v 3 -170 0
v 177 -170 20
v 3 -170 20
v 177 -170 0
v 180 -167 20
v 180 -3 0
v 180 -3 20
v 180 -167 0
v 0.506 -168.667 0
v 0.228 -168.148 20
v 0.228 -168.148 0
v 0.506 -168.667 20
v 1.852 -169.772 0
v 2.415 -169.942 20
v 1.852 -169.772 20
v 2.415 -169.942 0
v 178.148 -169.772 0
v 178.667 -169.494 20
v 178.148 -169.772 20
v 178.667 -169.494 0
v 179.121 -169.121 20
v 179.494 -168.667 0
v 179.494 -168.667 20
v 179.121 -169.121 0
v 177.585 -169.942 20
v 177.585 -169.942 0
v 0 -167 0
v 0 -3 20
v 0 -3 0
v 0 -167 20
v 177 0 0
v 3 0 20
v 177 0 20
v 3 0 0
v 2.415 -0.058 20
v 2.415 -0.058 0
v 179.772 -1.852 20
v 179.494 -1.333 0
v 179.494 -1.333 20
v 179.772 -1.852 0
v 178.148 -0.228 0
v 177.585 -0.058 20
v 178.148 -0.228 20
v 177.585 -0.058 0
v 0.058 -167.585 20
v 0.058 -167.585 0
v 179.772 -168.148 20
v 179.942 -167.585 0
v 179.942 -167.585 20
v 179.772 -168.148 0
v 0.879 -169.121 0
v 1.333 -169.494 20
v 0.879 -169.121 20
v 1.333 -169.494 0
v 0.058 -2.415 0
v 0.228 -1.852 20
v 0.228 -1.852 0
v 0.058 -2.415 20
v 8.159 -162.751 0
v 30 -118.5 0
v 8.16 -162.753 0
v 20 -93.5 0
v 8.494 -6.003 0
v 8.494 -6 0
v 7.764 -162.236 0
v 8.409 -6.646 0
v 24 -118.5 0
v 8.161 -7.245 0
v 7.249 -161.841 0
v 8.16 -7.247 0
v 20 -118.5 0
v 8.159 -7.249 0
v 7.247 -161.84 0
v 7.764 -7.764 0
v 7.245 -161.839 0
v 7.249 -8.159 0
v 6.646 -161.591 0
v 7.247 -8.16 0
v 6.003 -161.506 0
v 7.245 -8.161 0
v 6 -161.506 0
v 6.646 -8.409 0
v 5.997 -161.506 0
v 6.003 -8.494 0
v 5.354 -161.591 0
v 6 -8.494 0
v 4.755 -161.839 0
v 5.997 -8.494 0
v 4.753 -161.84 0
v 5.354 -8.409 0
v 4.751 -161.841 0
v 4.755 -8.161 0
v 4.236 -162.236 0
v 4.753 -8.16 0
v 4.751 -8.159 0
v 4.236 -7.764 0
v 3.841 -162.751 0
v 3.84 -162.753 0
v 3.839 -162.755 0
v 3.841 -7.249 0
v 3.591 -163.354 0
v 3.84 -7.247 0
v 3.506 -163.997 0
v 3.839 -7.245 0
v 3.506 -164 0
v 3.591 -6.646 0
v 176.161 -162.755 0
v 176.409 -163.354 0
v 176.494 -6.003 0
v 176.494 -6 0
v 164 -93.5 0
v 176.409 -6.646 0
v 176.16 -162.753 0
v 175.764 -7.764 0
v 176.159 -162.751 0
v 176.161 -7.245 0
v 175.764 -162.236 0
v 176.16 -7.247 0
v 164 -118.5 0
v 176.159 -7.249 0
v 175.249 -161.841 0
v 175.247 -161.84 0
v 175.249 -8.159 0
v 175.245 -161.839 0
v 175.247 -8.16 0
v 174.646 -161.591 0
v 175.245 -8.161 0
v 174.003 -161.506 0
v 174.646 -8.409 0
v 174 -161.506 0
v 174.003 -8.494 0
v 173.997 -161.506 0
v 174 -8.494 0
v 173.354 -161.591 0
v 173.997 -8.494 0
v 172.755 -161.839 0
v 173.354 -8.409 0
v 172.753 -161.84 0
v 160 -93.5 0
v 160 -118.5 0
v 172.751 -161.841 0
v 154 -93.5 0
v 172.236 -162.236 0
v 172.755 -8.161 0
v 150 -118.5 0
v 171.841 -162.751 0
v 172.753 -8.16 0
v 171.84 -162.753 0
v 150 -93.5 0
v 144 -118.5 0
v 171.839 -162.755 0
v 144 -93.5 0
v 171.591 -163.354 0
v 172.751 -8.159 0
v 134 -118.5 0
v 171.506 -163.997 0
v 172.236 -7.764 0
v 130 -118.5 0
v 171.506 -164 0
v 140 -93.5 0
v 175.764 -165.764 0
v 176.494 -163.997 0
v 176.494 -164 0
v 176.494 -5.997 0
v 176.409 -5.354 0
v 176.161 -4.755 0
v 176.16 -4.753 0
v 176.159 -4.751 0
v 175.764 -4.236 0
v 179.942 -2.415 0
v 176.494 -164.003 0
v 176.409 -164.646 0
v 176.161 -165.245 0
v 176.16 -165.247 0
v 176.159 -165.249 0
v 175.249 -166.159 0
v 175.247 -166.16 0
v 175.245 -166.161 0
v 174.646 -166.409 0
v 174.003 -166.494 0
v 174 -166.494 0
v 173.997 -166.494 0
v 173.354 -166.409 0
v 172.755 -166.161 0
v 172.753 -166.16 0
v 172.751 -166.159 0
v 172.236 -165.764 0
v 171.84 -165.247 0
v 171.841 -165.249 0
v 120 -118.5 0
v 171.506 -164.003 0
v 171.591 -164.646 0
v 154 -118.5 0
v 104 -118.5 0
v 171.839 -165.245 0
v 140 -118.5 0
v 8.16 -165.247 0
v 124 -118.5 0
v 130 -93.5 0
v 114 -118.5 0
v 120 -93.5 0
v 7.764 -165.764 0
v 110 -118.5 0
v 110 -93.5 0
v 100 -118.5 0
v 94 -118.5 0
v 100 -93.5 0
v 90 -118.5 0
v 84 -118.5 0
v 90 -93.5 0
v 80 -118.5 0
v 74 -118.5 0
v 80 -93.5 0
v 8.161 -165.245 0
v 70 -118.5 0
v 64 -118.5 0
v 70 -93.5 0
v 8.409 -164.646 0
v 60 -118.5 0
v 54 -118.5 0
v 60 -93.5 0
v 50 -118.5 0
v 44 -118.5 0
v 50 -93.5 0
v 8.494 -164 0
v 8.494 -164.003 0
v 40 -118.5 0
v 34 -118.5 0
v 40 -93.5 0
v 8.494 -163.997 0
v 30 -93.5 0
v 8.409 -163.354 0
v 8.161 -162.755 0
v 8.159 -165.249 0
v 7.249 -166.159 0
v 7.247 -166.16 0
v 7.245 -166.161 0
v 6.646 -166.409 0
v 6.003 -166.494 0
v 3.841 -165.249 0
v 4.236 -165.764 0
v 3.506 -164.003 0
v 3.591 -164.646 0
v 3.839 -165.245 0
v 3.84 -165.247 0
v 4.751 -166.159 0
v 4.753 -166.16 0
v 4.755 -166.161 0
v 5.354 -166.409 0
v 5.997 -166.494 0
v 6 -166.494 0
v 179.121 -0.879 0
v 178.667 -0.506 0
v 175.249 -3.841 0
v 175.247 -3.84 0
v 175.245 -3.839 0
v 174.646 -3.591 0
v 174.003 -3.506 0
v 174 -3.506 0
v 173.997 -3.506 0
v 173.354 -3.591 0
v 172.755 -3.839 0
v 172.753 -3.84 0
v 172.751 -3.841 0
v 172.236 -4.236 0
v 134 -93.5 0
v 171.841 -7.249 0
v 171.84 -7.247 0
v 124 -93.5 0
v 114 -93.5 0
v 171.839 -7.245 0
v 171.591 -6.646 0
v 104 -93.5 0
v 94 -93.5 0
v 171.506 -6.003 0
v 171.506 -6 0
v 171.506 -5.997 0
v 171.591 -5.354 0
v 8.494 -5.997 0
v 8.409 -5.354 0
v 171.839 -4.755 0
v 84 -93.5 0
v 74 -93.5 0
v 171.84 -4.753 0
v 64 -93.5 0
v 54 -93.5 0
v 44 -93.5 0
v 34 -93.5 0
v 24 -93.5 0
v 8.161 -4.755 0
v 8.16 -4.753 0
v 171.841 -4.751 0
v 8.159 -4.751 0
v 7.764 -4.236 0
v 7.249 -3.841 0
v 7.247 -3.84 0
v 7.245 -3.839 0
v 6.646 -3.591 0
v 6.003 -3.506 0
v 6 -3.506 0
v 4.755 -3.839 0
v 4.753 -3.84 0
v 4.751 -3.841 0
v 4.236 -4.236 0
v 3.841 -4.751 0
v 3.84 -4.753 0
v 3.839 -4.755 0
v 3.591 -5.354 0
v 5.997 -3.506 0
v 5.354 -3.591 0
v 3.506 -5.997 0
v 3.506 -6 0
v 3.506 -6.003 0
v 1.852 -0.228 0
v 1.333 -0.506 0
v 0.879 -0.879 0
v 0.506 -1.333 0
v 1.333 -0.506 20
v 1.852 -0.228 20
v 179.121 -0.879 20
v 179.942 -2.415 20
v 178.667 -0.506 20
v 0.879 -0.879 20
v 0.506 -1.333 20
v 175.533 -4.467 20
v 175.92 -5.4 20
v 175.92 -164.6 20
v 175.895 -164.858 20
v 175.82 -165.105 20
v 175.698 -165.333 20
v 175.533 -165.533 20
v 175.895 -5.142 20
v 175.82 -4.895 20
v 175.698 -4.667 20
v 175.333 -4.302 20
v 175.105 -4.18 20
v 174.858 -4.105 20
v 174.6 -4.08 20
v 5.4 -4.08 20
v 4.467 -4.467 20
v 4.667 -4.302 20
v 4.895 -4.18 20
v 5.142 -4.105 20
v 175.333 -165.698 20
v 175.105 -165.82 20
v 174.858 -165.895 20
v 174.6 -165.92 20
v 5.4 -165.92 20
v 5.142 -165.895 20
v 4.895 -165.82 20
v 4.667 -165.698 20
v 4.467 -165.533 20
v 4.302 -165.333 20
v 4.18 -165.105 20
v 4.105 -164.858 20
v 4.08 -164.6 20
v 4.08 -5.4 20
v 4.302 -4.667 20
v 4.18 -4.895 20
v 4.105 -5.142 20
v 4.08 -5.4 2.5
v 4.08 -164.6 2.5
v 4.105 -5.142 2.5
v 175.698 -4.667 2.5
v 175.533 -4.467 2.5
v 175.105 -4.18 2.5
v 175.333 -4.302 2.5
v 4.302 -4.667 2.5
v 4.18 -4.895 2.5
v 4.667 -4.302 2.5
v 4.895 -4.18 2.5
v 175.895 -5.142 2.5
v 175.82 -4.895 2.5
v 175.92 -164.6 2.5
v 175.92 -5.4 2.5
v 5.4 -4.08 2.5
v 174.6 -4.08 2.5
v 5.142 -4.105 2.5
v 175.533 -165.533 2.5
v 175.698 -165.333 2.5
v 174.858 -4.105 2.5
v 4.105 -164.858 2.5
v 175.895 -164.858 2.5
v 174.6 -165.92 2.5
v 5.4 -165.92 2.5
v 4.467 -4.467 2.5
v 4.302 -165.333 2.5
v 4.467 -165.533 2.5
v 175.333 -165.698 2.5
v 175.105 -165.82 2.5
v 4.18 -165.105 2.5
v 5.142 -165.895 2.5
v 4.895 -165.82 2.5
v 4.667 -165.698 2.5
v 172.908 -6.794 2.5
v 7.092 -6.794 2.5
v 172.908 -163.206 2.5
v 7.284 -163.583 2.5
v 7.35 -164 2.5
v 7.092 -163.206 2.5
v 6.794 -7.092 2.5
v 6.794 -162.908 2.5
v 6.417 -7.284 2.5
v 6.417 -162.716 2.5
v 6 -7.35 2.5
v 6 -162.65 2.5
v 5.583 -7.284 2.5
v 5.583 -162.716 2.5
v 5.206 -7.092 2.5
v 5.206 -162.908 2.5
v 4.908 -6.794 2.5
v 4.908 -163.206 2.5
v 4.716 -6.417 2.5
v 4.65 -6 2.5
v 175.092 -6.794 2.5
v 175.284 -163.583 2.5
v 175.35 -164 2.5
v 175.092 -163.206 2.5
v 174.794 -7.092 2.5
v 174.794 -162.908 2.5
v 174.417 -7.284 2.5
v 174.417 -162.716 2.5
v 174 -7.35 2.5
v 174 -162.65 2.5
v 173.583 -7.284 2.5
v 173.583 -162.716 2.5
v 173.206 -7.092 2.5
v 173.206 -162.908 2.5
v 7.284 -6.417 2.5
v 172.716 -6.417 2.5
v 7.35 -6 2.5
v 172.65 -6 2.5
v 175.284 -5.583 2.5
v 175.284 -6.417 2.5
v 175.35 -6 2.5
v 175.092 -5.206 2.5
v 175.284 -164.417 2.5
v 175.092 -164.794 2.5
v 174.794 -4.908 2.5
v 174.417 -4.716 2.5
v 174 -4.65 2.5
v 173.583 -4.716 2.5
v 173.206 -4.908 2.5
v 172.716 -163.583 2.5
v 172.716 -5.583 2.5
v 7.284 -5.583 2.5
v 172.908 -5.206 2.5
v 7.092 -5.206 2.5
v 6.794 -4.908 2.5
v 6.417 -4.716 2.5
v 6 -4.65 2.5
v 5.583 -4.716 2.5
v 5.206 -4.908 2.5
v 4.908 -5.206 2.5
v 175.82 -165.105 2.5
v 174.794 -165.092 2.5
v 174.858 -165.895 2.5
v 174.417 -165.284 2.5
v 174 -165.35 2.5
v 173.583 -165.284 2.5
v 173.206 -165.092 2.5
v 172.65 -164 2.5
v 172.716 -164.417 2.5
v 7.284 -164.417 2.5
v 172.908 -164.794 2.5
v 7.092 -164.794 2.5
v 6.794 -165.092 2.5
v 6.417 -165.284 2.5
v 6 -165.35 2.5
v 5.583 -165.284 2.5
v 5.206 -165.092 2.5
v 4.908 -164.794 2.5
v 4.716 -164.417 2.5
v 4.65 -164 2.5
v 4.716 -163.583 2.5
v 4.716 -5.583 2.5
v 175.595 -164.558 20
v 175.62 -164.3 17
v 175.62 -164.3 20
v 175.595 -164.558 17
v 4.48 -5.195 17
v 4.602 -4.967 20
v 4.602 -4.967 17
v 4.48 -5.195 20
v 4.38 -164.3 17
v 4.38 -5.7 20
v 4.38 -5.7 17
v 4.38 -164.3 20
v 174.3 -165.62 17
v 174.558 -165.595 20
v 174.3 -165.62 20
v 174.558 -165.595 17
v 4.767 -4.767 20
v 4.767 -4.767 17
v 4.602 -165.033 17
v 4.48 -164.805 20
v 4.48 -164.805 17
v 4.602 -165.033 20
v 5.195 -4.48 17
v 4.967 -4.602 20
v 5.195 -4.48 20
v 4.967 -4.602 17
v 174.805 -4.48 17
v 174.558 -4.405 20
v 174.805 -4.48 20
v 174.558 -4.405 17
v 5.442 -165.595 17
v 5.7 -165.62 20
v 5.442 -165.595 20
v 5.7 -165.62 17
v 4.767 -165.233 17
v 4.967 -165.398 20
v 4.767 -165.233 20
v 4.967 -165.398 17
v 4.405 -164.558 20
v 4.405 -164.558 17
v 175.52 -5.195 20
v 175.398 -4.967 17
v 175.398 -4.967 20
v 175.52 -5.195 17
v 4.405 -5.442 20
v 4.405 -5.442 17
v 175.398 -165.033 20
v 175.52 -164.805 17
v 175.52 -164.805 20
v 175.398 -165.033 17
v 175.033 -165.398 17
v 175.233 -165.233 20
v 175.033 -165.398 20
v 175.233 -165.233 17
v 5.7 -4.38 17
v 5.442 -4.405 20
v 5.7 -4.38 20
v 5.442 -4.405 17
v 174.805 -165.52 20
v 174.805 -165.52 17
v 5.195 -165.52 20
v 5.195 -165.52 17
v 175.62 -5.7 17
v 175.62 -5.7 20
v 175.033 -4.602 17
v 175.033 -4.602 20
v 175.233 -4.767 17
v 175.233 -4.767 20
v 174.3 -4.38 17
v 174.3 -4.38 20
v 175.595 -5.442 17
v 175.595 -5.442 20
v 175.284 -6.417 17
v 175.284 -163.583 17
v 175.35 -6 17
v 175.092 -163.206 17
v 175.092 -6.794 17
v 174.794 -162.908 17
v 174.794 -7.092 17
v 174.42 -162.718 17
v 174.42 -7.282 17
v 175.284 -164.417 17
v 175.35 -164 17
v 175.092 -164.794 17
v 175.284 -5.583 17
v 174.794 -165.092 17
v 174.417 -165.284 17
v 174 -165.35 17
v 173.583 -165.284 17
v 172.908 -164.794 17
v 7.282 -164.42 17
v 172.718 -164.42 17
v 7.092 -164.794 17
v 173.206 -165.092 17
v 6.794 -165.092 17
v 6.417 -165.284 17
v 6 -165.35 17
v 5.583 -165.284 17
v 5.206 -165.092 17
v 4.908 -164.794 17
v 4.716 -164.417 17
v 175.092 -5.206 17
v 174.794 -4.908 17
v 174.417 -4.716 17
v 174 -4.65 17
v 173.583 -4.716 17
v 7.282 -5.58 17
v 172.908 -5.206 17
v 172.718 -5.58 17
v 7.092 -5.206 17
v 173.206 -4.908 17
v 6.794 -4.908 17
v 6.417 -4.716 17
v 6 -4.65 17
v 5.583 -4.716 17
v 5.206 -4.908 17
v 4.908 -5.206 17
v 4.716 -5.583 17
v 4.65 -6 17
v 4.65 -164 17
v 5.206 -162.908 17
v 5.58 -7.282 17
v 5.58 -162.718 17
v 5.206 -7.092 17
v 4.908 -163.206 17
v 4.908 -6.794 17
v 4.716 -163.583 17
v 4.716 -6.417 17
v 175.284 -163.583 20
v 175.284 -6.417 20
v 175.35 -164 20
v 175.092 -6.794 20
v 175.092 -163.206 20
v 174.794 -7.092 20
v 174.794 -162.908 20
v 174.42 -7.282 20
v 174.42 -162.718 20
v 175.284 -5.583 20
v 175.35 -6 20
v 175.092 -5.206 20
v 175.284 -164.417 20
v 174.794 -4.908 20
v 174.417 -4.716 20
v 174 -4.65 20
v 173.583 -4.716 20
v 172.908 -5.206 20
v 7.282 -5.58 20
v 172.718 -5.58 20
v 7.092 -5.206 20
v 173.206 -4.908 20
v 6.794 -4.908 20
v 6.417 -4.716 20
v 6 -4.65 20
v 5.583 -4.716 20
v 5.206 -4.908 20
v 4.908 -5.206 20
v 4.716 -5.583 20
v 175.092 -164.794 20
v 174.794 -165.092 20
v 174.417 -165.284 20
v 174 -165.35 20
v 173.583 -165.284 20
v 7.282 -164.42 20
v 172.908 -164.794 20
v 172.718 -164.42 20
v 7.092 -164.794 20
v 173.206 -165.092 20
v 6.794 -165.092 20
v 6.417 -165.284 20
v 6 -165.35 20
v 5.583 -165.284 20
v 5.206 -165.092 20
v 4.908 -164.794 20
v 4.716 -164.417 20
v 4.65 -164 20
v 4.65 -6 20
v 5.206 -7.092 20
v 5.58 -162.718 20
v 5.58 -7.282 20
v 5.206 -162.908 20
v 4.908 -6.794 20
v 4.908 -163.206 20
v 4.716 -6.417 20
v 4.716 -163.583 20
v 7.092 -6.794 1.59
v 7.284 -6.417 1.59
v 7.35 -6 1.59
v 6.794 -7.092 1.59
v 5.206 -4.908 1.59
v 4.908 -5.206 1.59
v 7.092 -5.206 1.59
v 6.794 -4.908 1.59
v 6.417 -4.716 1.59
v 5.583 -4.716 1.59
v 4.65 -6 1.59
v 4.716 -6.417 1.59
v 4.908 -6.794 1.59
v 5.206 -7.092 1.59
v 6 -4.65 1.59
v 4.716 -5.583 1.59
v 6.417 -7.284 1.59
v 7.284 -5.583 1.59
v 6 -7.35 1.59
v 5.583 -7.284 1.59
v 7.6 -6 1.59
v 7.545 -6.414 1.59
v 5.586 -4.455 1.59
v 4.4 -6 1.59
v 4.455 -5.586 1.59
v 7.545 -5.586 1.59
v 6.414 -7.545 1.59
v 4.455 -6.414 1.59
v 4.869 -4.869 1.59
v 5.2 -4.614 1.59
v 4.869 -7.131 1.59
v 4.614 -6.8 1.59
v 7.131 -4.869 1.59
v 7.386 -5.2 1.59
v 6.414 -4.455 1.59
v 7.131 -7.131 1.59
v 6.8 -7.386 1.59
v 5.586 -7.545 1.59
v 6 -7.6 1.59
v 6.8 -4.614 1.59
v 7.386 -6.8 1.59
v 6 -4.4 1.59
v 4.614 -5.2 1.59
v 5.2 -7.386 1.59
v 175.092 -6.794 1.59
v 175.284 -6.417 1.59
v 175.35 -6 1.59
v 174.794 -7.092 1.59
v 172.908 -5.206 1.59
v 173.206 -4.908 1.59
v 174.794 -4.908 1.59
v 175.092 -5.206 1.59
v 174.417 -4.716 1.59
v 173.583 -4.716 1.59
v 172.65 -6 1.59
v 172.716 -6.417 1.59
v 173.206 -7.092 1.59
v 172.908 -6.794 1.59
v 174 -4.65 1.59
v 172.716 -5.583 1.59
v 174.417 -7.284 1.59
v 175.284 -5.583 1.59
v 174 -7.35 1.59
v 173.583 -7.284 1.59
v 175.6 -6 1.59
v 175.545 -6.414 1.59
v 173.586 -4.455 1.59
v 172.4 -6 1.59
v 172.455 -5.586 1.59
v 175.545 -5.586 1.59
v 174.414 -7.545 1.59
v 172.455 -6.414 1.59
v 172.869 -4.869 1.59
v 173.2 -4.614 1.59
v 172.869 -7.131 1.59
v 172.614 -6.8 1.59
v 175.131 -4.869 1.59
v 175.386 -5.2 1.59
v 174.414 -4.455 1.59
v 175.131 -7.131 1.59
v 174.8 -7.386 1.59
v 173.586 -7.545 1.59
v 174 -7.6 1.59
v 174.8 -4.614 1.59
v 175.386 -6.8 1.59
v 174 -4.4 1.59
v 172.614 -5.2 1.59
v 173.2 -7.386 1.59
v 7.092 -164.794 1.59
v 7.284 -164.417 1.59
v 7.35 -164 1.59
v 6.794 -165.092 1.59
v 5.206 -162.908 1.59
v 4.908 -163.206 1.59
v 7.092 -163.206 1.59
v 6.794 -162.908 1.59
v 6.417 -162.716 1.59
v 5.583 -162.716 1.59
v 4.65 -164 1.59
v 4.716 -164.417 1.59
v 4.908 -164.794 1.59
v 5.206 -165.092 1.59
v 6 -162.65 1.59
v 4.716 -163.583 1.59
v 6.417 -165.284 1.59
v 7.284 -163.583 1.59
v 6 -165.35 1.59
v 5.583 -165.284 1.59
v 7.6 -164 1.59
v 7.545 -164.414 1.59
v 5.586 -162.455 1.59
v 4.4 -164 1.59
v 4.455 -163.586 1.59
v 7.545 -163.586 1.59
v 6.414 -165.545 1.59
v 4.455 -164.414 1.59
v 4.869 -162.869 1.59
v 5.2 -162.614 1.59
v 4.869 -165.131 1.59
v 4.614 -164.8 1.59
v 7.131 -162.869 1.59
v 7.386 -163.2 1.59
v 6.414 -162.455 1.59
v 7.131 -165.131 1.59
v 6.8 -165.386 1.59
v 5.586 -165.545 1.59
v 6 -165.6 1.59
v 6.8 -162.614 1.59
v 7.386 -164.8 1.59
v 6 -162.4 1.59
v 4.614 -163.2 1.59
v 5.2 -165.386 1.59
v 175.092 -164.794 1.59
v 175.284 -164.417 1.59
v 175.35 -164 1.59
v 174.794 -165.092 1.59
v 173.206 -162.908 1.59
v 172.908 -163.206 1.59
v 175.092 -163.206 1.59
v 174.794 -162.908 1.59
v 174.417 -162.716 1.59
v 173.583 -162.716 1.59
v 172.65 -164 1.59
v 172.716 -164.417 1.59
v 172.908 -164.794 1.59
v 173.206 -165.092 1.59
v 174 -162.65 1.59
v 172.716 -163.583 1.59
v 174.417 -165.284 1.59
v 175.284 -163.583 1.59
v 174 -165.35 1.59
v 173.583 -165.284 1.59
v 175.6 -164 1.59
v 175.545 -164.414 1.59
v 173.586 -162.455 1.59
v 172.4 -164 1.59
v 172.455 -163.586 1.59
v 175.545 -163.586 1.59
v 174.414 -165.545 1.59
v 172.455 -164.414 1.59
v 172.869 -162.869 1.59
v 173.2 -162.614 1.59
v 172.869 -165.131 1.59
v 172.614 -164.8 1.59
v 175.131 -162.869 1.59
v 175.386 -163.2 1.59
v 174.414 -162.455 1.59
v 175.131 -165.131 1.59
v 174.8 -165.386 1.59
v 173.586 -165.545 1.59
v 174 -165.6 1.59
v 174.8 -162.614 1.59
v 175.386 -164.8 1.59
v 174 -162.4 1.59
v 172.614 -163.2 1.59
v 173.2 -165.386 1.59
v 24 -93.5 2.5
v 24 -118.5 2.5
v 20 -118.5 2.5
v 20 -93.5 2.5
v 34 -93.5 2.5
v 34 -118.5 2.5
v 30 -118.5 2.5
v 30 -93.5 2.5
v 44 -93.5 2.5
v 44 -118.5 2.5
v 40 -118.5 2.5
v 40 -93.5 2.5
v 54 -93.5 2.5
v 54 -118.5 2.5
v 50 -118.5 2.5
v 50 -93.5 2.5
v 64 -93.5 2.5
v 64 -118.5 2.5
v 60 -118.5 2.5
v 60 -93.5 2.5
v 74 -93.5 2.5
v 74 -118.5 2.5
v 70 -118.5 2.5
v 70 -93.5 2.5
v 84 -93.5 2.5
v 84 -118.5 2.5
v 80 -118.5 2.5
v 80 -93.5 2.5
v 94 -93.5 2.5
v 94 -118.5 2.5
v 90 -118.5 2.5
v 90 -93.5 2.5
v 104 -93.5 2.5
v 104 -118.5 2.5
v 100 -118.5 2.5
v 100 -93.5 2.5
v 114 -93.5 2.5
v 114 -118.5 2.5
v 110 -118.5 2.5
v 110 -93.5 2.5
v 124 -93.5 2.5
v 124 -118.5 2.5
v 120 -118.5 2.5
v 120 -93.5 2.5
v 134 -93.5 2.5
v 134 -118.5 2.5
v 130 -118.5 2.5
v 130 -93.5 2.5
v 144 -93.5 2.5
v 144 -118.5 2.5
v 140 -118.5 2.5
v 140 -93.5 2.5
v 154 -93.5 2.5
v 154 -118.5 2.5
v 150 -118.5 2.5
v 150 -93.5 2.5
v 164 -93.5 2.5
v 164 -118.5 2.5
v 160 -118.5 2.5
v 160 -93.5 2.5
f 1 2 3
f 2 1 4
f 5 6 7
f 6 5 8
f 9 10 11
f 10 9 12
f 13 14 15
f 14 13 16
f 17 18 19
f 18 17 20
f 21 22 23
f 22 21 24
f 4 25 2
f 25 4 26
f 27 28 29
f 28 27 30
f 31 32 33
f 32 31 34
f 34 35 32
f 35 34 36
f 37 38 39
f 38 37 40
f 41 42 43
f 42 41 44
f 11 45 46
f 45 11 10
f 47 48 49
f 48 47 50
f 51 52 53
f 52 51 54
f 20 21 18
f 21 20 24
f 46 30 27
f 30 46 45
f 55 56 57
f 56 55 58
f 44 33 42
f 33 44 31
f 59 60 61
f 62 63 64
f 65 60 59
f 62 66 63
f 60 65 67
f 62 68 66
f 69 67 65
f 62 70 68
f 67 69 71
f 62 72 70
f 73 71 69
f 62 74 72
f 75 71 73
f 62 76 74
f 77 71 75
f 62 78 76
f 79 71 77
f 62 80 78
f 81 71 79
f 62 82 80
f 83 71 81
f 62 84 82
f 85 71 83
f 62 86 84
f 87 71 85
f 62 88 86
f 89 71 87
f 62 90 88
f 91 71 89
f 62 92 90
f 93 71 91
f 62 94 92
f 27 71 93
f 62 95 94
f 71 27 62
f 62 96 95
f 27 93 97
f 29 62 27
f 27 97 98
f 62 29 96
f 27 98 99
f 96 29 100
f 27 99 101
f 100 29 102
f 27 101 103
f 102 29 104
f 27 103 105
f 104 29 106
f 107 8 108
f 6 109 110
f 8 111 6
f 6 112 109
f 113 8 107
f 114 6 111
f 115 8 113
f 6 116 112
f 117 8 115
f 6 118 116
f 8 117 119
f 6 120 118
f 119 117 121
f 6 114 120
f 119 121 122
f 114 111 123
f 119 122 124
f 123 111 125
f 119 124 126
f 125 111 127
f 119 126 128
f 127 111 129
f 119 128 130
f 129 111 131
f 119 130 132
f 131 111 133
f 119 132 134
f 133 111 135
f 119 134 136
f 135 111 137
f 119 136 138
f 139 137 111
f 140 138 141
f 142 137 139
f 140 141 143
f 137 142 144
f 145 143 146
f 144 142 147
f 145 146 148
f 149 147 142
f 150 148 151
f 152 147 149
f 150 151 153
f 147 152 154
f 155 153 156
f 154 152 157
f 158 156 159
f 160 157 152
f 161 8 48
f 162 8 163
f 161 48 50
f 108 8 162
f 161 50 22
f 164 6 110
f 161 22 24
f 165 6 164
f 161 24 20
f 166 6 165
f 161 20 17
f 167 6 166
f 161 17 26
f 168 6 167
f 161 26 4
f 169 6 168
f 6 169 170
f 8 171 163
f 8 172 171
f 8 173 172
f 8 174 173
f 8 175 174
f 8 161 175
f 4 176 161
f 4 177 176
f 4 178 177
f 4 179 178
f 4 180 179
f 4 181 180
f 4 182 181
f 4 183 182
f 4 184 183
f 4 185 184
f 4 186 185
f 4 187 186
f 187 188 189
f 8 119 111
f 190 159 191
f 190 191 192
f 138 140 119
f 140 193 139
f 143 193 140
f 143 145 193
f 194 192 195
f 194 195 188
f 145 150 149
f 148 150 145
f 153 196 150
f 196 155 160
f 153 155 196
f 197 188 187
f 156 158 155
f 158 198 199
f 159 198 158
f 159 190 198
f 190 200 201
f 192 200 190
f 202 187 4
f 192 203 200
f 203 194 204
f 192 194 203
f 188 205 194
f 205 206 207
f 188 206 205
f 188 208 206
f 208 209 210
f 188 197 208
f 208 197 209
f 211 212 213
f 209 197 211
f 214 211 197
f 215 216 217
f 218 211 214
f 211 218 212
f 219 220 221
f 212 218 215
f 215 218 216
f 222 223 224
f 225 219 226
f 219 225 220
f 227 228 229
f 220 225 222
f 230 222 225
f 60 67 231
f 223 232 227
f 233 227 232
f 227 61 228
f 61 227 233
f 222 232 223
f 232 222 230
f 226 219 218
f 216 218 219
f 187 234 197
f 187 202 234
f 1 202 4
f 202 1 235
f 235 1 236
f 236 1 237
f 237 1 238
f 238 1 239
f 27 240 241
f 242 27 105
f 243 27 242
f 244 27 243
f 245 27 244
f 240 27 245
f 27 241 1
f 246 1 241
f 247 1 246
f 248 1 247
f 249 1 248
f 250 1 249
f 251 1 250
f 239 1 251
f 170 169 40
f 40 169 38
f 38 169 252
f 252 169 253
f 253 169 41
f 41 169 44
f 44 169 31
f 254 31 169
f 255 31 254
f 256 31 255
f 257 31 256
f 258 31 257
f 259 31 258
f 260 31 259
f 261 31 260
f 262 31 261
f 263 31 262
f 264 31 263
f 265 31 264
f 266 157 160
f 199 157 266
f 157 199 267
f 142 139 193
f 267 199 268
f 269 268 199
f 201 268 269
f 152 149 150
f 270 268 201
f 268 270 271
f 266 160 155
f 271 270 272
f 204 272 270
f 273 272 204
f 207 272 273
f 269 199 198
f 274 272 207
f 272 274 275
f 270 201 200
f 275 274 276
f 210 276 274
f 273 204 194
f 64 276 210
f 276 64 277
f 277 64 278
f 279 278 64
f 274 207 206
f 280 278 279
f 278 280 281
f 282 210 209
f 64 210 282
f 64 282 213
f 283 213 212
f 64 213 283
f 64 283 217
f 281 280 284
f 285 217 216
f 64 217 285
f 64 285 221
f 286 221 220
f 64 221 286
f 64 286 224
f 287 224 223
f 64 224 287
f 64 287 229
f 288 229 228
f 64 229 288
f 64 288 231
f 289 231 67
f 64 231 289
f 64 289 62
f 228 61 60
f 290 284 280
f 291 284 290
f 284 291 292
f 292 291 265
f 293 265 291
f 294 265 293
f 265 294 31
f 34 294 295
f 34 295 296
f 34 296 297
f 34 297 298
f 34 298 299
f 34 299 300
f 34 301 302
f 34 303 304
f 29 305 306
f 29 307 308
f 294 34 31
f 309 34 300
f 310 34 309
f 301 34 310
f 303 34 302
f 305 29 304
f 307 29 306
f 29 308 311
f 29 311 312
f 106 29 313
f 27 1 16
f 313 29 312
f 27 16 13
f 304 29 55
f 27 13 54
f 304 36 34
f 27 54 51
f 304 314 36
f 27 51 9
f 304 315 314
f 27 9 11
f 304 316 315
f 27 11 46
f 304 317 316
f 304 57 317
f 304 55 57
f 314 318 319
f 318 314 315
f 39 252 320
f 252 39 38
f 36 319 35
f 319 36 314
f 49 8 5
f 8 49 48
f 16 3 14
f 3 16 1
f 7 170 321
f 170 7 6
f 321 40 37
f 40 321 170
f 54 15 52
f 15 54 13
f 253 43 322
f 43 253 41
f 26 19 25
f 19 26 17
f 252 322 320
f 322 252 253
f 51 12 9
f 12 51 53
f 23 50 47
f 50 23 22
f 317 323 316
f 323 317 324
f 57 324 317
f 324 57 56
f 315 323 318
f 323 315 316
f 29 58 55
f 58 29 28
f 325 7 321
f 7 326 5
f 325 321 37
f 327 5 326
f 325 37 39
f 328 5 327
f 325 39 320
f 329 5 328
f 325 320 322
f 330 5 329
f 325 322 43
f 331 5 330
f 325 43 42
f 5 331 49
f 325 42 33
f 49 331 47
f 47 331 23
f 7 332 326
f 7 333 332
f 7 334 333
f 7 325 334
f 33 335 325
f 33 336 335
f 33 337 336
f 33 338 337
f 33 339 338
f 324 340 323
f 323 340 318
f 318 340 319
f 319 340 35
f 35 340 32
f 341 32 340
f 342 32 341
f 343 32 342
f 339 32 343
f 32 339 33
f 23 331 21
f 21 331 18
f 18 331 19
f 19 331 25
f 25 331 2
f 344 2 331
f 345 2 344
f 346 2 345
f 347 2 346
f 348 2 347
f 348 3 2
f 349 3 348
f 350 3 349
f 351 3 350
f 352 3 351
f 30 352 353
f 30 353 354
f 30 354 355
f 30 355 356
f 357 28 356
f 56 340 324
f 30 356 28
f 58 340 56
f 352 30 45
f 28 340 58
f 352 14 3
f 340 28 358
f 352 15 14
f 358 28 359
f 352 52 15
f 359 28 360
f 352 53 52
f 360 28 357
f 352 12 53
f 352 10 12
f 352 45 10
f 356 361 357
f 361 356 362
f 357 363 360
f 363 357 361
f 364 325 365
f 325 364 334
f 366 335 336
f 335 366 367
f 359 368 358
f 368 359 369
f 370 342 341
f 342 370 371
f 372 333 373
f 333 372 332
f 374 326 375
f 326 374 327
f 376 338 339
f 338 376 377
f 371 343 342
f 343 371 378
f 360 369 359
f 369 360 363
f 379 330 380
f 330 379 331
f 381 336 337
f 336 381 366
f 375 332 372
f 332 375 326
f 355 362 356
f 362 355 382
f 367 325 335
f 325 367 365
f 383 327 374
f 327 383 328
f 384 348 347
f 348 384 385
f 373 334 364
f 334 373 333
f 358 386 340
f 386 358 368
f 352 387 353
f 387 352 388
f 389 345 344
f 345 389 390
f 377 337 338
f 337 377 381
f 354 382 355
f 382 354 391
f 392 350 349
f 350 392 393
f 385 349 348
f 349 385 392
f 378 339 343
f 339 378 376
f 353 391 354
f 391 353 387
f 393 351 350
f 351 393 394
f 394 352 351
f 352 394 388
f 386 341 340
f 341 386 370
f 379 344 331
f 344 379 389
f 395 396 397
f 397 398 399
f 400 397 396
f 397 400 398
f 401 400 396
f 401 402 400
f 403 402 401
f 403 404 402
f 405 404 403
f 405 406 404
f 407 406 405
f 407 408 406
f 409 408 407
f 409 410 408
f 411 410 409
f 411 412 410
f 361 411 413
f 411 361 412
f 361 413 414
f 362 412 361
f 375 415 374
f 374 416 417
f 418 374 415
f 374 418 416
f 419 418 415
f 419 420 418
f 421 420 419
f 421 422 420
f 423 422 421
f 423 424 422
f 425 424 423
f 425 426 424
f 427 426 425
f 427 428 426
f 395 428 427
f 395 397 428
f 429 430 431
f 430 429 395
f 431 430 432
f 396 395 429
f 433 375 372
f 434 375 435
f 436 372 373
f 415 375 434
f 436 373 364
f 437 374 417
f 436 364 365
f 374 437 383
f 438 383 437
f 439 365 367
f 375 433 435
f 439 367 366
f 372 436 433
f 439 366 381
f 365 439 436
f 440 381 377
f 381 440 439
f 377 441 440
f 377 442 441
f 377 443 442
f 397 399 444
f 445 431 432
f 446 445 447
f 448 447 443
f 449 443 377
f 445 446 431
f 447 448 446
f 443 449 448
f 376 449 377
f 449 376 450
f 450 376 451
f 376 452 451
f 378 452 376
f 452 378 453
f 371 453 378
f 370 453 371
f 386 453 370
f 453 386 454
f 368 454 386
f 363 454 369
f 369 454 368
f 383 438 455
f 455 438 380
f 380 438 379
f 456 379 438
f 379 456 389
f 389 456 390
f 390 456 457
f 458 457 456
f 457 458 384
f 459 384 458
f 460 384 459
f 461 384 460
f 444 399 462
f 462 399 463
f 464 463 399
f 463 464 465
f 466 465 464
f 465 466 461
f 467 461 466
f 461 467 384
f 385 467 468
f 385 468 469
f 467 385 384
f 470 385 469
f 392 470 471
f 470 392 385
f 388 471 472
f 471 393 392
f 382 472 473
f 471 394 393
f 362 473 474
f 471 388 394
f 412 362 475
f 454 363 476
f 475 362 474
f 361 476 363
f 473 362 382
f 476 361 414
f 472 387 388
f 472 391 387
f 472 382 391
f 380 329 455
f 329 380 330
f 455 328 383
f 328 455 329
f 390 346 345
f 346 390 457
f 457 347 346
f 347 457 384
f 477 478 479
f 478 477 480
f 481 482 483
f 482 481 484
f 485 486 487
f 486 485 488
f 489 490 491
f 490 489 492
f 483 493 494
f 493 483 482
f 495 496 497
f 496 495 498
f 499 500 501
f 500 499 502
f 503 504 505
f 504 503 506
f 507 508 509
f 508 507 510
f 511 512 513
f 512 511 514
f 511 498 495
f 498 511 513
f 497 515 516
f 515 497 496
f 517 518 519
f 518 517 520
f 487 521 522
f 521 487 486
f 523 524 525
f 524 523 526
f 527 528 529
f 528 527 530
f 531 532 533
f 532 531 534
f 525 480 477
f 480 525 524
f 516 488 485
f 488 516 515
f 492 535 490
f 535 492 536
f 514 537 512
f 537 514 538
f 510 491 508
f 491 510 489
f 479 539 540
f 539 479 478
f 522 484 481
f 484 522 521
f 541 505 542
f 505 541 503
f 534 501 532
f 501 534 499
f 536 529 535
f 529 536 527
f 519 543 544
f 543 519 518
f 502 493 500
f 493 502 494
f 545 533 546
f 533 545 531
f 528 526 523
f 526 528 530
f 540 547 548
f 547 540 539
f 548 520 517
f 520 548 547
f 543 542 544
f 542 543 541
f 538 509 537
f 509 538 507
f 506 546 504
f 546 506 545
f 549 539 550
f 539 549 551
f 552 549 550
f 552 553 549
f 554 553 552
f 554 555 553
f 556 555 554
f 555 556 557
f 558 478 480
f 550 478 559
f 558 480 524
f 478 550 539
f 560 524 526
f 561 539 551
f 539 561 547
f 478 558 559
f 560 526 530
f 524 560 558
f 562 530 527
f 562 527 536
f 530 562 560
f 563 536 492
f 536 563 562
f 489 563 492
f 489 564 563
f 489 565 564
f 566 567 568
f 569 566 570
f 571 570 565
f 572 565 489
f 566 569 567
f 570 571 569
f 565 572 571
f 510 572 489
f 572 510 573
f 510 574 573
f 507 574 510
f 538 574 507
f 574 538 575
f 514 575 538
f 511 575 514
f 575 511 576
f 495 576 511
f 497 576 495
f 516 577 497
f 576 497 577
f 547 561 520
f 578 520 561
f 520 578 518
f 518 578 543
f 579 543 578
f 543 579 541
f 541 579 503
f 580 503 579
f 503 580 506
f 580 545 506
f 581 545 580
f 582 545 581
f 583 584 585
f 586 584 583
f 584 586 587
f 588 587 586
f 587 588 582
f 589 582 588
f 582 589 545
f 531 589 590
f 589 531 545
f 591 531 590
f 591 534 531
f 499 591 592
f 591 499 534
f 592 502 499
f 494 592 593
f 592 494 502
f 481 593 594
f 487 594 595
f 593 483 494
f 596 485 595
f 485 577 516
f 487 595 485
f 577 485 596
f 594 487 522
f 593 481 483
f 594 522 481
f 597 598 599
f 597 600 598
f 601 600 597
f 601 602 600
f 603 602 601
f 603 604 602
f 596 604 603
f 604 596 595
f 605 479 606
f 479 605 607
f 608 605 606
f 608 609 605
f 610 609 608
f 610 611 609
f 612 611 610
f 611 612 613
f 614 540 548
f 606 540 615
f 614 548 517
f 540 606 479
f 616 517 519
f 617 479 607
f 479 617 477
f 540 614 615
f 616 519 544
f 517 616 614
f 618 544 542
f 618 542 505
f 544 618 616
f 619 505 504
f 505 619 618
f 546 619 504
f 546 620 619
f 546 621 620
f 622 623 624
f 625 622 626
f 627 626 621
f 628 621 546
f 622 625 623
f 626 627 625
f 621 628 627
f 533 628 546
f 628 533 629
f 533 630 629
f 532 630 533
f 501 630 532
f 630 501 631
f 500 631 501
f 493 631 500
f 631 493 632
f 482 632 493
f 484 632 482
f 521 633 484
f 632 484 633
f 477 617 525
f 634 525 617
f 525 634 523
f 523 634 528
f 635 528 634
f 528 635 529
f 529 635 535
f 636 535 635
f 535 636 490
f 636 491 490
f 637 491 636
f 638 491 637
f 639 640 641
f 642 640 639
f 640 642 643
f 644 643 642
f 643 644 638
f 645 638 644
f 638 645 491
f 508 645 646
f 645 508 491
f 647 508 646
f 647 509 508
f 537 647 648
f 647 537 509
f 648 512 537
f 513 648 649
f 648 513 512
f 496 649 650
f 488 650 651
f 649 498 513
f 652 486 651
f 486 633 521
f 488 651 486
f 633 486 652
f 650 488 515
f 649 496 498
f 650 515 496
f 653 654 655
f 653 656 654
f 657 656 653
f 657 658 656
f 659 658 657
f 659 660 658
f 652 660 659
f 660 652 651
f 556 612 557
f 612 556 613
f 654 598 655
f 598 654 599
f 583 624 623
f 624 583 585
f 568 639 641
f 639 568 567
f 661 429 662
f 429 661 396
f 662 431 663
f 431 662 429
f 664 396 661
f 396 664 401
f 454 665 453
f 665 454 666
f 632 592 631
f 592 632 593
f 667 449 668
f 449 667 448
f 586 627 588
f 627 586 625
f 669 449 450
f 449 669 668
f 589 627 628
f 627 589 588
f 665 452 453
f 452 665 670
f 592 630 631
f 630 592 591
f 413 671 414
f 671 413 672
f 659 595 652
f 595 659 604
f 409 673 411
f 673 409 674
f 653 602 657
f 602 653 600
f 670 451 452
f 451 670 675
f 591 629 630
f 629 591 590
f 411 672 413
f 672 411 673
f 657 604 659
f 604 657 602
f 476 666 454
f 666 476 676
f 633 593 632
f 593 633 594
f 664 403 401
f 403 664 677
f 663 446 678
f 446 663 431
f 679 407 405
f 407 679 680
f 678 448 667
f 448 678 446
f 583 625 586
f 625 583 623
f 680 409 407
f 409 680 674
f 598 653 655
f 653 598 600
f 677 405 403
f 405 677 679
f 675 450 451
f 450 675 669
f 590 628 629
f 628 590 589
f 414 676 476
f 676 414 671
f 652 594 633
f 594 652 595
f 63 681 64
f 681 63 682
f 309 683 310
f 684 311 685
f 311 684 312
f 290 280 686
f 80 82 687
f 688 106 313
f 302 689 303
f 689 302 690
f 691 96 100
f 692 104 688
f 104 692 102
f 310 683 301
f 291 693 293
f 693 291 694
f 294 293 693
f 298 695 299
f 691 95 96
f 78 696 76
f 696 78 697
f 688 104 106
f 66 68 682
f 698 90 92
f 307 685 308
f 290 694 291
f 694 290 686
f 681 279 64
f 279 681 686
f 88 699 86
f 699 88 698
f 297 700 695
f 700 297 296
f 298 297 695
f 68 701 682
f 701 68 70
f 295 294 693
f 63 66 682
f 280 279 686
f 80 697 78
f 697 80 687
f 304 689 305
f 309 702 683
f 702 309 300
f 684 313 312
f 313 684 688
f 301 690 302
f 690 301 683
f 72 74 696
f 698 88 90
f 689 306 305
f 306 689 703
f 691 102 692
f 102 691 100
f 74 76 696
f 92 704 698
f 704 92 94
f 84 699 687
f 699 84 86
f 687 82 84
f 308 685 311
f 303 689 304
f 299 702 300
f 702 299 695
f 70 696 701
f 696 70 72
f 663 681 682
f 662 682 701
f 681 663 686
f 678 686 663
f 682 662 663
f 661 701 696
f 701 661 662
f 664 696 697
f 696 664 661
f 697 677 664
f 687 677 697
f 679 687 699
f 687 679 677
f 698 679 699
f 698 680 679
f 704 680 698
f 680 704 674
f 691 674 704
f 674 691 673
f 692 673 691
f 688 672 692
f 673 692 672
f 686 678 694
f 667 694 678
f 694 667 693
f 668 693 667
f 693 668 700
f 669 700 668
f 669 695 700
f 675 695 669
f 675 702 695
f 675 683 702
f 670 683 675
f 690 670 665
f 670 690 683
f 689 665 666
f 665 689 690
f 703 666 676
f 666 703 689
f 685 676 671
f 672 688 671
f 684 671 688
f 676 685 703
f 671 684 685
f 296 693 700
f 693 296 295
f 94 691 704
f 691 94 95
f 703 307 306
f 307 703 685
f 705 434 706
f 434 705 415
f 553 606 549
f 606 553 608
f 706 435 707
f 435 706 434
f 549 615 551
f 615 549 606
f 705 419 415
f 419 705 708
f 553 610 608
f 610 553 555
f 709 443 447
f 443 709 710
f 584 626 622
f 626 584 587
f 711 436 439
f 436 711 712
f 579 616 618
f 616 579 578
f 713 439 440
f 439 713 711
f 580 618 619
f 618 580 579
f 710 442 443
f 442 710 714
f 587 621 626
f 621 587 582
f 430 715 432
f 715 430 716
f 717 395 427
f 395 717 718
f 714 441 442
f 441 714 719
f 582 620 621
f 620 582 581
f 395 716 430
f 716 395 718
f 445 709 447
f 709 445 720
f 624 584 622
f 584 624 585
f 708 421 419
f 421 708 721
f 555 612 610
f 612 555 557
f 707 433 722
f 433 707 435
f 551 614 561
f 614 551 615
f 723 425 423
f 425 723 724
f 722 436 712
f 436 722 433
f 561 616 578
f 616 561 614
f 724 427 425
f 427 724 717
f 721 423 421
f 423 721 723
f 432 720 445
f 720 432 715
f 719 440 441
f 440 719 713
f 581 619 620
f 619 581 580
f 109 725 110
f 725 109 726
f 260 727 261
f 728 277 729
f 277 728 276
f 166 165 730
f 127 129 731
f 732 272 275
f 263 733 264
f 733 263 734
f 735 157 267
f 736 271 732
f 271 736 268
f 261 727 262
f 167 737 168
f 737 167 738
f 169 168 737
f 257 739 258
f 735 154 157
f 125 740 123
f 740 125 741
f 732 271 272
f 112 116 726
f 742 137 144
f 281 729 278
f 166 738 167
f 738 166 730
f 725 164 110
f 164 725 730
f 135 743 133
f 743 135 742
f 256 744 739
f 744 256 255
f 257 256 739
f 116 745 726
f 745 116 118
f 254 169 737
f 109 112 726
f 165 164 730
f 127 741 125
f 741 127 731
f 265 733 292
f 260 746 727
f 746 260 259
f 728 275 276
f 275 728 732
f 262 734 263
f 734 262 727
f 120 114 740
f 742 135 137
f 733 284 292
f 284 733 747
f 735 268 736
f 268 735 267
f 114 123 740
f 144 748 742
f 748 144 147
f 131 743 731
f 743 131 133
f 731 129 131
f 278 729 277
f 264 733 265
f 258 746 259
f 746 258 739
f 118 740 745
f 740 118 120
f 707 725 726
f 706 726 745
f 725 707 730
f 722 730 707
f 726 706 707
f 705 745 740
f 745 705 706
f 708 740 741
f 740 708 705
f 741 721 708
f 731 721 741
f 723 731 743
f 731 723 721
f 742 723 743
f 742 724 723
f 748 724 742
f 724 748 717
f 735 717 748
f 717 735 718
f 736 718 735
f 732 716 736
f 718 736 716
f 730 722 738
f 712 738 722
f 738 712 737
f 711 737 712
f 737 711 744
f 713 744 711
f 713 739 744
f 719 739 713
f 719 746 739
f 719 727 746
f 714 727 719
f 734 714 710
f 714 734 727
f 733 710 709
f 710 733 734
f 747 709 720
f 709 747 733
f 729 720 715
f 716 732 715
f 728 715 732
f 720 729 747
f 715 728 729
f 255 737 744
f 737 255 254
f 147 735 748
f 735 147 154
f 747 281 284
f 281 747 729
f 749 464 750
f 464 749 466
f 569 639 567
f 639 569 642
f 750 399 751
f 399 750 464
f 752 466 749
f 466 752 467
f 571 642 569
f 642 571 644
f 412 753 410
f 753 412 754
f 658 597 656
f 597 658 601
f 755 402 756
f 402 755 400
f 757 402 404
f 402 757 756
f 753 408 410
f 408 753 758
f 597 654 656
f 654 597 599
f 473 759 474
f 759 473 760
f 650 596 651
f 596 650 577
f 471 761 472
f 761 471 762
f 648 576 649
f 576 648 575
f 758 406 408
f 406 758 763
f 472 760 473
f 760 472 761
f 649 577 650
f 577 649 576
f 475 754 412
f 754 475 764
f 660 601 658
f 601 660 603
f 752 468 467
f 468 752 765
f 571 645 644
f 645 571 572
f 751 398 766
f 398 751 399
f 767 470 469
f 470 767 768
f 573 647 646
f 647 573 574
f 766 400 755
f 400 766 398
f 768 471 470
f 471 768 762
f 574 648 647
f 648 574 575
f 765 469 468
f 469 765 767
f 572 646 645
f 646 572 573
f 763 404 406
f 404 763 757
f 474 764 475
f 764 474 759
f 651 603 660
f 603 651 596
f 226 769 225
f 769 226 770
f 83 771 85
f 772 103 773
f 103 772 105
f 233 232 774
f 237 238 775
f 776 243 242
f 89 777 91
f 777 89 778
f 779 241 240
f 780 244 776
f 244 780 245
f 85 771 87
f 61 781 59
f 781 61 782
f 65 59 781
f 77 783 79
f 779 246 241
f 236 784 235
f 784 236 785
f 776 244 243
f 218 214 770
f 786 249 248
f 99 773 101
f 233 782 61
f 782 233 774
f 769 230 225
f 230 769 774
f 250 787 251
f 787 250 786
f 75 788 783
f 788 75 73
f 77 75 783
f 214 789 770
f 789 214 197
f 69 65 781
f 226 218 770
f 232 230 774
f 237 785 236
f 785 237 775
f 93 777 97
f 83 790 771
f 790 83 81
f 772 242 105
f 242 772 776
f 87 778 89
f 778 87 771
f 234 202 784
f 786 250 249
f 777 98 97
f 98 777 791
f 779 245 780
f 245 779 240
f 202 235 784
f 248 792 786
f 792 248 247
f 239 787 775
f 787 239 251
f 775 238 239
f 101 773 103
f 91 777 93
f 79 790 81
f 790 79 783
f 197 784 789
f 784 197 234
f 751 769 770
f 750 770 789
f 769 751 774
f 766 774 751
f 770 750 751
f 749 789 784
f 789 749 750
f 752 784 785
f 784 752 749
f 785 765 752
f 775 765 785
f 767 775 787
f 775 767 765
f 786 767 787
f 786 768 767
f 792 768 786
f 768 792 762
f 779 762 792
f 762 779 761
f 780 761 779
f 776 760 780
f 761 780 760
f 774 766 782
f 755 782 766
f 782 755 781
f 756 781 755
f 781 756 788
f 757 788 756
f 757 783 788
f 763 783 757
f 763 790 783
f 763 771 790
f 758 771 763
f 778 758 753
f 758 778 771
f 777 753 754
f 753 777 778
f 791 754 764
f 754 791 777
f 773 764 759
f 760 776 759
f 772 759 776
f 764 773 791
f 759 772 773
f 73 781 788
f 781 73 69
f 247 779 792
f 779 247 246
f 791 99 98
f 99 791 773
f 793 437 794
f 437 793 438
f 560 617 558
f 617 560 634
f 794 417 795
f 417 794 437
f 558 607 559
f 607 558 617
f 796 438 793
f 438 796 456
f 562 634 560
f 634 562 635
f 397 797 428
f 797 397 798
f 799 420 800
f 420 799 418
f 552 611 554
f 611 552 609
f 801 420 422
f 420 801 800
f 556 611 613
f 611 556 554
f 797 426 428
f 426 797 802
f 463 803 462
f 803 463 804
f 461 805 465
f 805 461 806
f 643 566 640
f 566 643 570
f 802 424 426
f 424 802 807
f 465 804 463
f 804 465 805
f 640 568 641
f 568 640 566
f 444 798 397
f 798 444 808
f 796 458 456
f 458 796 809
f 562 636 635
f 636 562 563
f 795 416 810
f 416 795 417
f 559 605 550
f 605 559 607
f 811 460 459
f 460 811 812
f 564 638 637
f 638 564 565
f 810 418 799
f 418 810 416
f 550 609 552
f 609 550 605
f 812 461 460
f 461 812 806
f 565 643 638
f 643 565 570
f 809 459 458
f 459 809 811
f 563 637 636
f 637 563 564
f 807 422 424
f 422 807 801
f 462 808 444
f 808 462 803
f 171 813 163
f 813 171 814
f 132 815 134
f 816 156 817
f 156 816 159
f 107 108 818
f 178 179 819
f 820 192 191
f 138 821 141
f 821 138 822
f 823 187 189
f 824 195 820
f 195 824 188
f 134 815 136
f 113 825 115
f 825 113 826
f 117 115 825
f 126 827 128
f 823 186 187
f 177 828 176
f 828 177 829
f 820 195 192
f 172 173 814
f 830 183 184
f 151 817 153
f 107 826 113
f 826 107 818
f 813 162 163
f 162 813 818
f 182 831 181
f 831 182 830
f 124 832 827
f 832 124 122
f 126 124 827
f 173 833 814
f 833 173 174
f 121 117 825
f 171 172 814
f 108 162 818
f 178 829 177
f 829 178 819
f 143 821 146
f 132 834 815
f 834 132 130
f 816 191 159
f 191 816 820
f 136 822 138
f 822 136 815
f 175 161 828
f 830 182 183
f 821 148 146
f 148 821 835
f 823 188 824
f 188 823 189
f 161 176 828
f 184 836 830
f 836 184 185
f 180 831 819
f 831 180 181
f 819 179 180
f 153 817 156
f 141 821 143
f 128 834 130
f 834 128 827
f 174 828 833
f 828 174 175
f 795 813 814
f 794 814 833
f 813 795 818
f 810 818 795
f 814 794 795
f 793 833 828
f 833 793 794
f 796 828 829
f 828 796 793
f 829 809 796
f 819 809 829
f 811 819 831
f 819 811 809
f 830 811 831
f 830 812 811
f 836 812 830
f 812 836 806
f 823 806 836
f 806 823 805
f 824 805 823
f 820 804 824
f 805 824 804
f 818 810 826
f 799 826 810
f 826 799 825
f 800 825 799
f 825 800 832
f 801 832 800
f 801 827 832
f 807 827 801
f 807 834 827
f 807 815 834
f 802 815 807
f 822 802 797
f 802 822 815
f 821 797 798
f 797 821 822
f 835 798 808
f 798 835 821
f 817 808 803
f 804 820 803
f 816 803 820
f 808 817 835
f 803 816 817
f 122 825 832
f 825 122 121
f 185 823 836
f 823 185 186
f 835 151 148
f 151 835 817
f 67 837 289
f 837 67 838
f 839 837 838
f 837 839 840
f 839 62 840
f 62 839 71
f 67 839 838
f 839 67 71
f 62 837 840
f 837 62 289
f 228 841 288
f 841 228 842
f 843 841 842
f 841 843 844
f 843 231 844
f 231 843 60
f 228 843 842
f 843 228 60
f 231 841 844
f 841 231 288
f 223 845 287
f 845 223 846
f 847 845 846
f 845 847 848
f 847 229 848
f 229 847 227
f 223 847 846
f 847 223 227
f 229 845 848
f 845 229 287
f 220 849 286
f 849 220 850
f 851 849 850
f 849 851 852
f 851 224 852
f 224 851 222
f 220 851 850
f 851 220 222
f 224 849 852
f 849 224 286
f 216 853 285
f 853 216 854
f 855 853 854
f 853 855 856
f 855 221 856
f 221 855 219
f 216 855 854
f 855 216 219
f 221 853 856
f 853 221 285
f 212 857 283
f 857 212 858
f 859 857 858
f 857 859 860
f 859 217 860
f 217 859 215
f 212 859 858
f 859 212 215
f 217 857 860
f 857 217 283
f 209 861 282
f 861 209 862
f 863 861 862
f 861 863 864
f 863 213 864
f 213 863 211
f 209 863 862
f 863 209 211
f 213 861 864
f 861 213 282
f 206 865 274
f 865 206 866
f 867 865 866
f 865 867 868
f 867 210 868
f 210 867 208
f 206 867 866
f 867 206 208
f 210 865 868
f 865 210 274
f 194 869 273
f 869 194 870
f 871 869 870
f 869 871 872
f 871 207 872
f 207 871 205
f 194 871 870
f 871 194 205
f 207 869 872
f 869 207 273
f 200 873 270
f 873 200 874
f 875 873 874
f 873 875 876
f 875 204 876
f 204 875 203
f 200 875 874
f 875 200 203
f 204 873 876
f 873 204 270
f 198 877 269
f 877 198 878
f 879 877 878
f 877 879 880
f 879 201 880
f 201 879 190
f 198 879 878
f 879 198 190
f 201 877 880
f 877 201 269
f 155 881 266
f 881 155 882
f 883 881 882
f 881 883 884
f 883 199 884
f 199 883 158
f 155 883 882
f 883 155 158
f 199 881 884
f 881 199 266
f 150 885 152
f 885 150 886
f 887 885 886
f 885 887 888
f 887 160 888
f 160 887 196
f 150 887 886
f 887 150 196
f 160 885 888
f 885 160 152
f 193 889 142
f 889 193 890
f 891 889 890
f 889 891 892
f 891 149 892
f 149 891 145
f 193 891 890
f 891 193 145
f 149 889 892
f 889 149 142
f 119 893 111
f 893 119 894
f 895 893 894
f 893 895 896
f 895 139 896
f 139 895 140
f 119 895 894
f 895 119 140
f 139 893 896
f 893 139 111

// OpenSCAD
// file: case_params.scad
// case_params.scad — Gemeinsame Maße für Unterteil und Deckel
// Wird per `include <case_params.scad>` in beide eingebunden.

// ════════════════════════════════════════════════════════════════════
//  HAUPTMASSE — 1-DIN Standard
// ════════════════════════════════════════════════════════════════════

W  = 180;     // Breite
H  = 50;      // Gesamthöhe
D  = 170;     // Tiefe
T  = 2.4;     // Wandstärke
R  = 3;       // Eckenradius

// Trennlinie (Höhe Unterteil-Wände + Frontplatte)
SZ = 30;      // 60 % der Höhe → Frontplatte vollständig im Unterteil

// Spielraum für Deckel-Passung
LID_TOL = 0.3;

// ════════════════════════════════════════════════════════════════════
//  FRONTPLATTE  (jetzt Teil des Unterteils)
// ════════════════════════════════════════════════════════════════════

// Display: Waveshare 3,5" IPS – sichtbare Fläche 73×43 mm
DISP_W = 73;
DISP_H = 43;
DISP_X = 5;
DISP_Y = (H - DISP_H) / 2;
DISP_OFFSET = 6;   // Display sitzt 6 mm hinter der Front (für Backlight-Träger)

// Rotary Encoder
ENC_D = 7;
ENC_X = W - 18;
ENC_Y = H / 2;
ENC_OFFSET = 8;

// 4 Tasten zwischen Display und Encoder
BTN_D  = 6;
BTN_X  = DISP_X + DISP_W + 10;
BTN_Y0 = H/2 + 12;
BTN_DY = 8;
BUTTONS = [
    [BTN_X, BTN_Y0          ],
    [BTN_X, BTN_Y0 - BTN_DY ],
    [BTN_X, BTN_Y0 - 2*BTN_DY],
    [BTN_X, BTN_Y0 - 3*BTN_DY],
];

// Lautsprecher-Schlitze
SPK_X     = DISP_X;
SPK_Y     = 4;
SPK_W     = DISP_W;
SPK_H     = 4;
SPK_SLOTS = 12;

// 3,5mm Klinke
JACK_D = 7;
JACK_X = W - 10;
JACK_Y = 6;

// ════════════════════════════════════════════════════════════════════
//  RÜCKSEITE
// ════════════════════════════════════════════════════════════════════

SMA_X      = 18;
SMA_Y_R    = H / 2;
USBC_X     = 50;
USBC_W     = 10;
USBC_H     = 5;
USB_DATA_X = 75;
USB_DATA_W = 14;
USB_DATA_H = 7;

VENT_W   = 2;
VENT_GAP = 3.5;
VENT_N   = 18;
VENT_H   = 14;

// ════════════════════════════════════════════════════════════════════
//  RPI ZERO 2 W
// ════════════════════════════════════════════════════════════════════

ZERO_X       = 15;
ZERO_Y       = 15;
ZERO_HOLE_DX = 58;
ZERO_HOLE_DY = 23;
HOLE_D       = 2.6;
INSERT_D     = 3.8;
INSERT_H     = 4;
BOSS_H       = 5;

// SDR-Halter
SDR_X = ZERO_X + 70;
SDR_Y = 15;
SDR_W = 60;
SDR_D = 28;

// ════════════════════════════════════════════════════════════════════
//  DECKEL-BEFESTIGUNG  (4× M2.5 Schrauben in Ecken)
// ════════════════════════════════════════════════════════════════════

SCREW_INSET = 6;          // Abstand der Schraube von der Außenkante
SCREW_HOLE_D = 2.7;       // Durchgangsbohrung im Deckel
SCREW_HEAD_D = 5;         // Senkkopf-Durchmesser
SCREW_HEAD_H = 1.5;       // Senkkopf-Tiefe
SCREW_BOSS_OD = 6.5;      // Außendurchmesser Bosss-Säulen im Unterteil

// 4 Eckpositionen
SCREW_POS = [
    [SCREW_INSET,        SCREW_INSET       ],
    [W - SCREW_INSET,    SCREW_INSET       ],
    [SCREW_INSET,        D - SCREW_INSET   ],
    [W - SCREW_INSET,    D - SCREW_INSET   ],
];

// ════════════════════════════════════════════════════════════════════
//  HILFSMODULE
// ════════════════════════════════════════════════════════════════════

module rbox(w, d, h, r, wall) {
    difference() {
        hull() {
            for (x=[r, w-r]) for (y=[r, d-r])
                translate([x, y, 0]) cylinder(r=r, h=h, $fn=32);
        }
        translate([wall, wall, wall])
        hull() {
            for (x=[r, w-2*wall-r]) for (y=[r, d-2*wall-r])
                translate([x, y, 0]) cylinder(r=max(0.5, r-wall*0.7), h=h, $fn=32);
        }
    }
}

module boss(od=BOSS_OD_DEFAULT, ih=BOSS_H) {
    difference() {
        cylinder(d=od, h=ih + INSERT_H, $fn=24);
        translate([0,0,ih])   cylinder(d=INSERT_D, h=INSERT_H+0.1, $fn=20);
        translate([0,0,-0.1]) cylinder(d=HOLE_D,   h=ih+0.2,       $fn=20);
    }
}
BOSS_OD_DEFAULT = 6.5;
// main file
// scanner_lid.scad — Gehäuse-Deckel (nur Oberseite)
//
// Druck: Auf den Kopf gelegt drucken (Oberfläche zeigt nach unten = glatt).
//        OpenSCAD-PART unten dreht automatisch in Druckposition.
//
// Befestigung: 4× M2.5 Senkkopfschrauben in die Wärmeeinsätze im Unterteil.

include <case_params.scad>

PART = "print";   // "preview" = wie montiert | "print" = druckbereit auf Kopf

// ════════════════════════════════════════════════════════════════════
//  DECKEL
// ════════════════════════════════════════════════════════════════════

LID_H = H - SZ;   // Deckel-Höhe = Gesamthöhe minus Unterteil

module lid() {
    difference() {
        union() {
            // Deckelform (rundum-Rahmen + Oberseite)
            difference() {
                // Außenkontur
                hull() {
                    for (x=[R, W-R]) for (y=[R, D-R])
                        translate([x, y, 0]) cylinder(r=R, h=LID_H, $fn=32);
                }
                // Innenraum aushöhlen (lässt T mm Wand stehen)
                translate([T, T, -0.1])
                hull() {
                    for (x=[R, W-2*T-R]) for (y=[R, D-2*T-R])
                        translate([x, y, 0])
                            cylinder(r=max(0.5, R-T*0.7), h=LID_H - T, $fn=32);
                }
            }

            // Einlauf-Lippe: passt mit etwas Spiel in das Unterteil
            translate([T + LID_TOL, T + LID_TOL, 0])
                difference() {
                    // Lippe
                    hull() {
                        for (x=[R, W-2*T-2*LID_TOL-R]) for (y=[R, D-2*T-2*LID_TOL-R])
                            translate([x, y, 0])
                                cylinder(r=max(0.5, R-T*0.7), h=3, $fn=32);
                    }
                    // Innenraum auch hier raus
                    translate([1.2, 1.2, -0.1])
                    hull() {
                        for (x=[R, W-2*T-2*LID_TOL-2.4-R]) for (y=[R, D-2*T-2*LID_TOL-2.4-R])
                            translate([x, y, 0])
                                cylinder(r=max(0.5, R-T*0.7), h=3.2, $fn=32);
                    }
                }
        }

        // ── Schraublöcher mit Senkkopf ─────────────────────────────
        for (p=SCREW_POS) {
            translate([p[0], p[1], -0.1]) {
                // Durchgangsbohrung
                cylinder(d=SCREW_HOLE_D, h=LID_H + 0.2, $fn=20);
                // Senkkopf-Versenkung (Kegel)
                translate([0, 0, LID_H - SCREW_HEAD_H + 0.01])
                    cylinder(d1=SCREW_HOLE_D + 0.5,
                             d2=SCREW_HEAD_D,
                             h=SCREW_HEAD_H + 0.1, $fn=24);
            }
        }

        // ── Belüftungs-Schlitze Oberseite ──────────────────────────
        for (i=[0:14])
            translate([20 + i*10, D*0.55, LID_H - T - 0.1])
                cube([4, 25, T + 0.2]);

        // Optional: Mini-Logo-Aussparung (3D-druckbare Beschriftung)
        // translate([W/2 - 20, D/2, LID_H - 0.4])
        //     linear_extrude(0.5) text("SDR", size=8, halign="center");
    }
}

// ════════════════════════════════════════════════════════════════════
//  RENDER
// ════════════════════════════════════════════════════════════════════

if (PART == "print") {
    // Auf den Kopf zum Drucken (gute Oberfläche)
    translate([0, 0, LID_H]) rotate([180, 0, 0]) lid();
} else {
    // Wie montiert (oben auf dem Unterteil)
    translate([0, 0, SZ]) lid();
}
